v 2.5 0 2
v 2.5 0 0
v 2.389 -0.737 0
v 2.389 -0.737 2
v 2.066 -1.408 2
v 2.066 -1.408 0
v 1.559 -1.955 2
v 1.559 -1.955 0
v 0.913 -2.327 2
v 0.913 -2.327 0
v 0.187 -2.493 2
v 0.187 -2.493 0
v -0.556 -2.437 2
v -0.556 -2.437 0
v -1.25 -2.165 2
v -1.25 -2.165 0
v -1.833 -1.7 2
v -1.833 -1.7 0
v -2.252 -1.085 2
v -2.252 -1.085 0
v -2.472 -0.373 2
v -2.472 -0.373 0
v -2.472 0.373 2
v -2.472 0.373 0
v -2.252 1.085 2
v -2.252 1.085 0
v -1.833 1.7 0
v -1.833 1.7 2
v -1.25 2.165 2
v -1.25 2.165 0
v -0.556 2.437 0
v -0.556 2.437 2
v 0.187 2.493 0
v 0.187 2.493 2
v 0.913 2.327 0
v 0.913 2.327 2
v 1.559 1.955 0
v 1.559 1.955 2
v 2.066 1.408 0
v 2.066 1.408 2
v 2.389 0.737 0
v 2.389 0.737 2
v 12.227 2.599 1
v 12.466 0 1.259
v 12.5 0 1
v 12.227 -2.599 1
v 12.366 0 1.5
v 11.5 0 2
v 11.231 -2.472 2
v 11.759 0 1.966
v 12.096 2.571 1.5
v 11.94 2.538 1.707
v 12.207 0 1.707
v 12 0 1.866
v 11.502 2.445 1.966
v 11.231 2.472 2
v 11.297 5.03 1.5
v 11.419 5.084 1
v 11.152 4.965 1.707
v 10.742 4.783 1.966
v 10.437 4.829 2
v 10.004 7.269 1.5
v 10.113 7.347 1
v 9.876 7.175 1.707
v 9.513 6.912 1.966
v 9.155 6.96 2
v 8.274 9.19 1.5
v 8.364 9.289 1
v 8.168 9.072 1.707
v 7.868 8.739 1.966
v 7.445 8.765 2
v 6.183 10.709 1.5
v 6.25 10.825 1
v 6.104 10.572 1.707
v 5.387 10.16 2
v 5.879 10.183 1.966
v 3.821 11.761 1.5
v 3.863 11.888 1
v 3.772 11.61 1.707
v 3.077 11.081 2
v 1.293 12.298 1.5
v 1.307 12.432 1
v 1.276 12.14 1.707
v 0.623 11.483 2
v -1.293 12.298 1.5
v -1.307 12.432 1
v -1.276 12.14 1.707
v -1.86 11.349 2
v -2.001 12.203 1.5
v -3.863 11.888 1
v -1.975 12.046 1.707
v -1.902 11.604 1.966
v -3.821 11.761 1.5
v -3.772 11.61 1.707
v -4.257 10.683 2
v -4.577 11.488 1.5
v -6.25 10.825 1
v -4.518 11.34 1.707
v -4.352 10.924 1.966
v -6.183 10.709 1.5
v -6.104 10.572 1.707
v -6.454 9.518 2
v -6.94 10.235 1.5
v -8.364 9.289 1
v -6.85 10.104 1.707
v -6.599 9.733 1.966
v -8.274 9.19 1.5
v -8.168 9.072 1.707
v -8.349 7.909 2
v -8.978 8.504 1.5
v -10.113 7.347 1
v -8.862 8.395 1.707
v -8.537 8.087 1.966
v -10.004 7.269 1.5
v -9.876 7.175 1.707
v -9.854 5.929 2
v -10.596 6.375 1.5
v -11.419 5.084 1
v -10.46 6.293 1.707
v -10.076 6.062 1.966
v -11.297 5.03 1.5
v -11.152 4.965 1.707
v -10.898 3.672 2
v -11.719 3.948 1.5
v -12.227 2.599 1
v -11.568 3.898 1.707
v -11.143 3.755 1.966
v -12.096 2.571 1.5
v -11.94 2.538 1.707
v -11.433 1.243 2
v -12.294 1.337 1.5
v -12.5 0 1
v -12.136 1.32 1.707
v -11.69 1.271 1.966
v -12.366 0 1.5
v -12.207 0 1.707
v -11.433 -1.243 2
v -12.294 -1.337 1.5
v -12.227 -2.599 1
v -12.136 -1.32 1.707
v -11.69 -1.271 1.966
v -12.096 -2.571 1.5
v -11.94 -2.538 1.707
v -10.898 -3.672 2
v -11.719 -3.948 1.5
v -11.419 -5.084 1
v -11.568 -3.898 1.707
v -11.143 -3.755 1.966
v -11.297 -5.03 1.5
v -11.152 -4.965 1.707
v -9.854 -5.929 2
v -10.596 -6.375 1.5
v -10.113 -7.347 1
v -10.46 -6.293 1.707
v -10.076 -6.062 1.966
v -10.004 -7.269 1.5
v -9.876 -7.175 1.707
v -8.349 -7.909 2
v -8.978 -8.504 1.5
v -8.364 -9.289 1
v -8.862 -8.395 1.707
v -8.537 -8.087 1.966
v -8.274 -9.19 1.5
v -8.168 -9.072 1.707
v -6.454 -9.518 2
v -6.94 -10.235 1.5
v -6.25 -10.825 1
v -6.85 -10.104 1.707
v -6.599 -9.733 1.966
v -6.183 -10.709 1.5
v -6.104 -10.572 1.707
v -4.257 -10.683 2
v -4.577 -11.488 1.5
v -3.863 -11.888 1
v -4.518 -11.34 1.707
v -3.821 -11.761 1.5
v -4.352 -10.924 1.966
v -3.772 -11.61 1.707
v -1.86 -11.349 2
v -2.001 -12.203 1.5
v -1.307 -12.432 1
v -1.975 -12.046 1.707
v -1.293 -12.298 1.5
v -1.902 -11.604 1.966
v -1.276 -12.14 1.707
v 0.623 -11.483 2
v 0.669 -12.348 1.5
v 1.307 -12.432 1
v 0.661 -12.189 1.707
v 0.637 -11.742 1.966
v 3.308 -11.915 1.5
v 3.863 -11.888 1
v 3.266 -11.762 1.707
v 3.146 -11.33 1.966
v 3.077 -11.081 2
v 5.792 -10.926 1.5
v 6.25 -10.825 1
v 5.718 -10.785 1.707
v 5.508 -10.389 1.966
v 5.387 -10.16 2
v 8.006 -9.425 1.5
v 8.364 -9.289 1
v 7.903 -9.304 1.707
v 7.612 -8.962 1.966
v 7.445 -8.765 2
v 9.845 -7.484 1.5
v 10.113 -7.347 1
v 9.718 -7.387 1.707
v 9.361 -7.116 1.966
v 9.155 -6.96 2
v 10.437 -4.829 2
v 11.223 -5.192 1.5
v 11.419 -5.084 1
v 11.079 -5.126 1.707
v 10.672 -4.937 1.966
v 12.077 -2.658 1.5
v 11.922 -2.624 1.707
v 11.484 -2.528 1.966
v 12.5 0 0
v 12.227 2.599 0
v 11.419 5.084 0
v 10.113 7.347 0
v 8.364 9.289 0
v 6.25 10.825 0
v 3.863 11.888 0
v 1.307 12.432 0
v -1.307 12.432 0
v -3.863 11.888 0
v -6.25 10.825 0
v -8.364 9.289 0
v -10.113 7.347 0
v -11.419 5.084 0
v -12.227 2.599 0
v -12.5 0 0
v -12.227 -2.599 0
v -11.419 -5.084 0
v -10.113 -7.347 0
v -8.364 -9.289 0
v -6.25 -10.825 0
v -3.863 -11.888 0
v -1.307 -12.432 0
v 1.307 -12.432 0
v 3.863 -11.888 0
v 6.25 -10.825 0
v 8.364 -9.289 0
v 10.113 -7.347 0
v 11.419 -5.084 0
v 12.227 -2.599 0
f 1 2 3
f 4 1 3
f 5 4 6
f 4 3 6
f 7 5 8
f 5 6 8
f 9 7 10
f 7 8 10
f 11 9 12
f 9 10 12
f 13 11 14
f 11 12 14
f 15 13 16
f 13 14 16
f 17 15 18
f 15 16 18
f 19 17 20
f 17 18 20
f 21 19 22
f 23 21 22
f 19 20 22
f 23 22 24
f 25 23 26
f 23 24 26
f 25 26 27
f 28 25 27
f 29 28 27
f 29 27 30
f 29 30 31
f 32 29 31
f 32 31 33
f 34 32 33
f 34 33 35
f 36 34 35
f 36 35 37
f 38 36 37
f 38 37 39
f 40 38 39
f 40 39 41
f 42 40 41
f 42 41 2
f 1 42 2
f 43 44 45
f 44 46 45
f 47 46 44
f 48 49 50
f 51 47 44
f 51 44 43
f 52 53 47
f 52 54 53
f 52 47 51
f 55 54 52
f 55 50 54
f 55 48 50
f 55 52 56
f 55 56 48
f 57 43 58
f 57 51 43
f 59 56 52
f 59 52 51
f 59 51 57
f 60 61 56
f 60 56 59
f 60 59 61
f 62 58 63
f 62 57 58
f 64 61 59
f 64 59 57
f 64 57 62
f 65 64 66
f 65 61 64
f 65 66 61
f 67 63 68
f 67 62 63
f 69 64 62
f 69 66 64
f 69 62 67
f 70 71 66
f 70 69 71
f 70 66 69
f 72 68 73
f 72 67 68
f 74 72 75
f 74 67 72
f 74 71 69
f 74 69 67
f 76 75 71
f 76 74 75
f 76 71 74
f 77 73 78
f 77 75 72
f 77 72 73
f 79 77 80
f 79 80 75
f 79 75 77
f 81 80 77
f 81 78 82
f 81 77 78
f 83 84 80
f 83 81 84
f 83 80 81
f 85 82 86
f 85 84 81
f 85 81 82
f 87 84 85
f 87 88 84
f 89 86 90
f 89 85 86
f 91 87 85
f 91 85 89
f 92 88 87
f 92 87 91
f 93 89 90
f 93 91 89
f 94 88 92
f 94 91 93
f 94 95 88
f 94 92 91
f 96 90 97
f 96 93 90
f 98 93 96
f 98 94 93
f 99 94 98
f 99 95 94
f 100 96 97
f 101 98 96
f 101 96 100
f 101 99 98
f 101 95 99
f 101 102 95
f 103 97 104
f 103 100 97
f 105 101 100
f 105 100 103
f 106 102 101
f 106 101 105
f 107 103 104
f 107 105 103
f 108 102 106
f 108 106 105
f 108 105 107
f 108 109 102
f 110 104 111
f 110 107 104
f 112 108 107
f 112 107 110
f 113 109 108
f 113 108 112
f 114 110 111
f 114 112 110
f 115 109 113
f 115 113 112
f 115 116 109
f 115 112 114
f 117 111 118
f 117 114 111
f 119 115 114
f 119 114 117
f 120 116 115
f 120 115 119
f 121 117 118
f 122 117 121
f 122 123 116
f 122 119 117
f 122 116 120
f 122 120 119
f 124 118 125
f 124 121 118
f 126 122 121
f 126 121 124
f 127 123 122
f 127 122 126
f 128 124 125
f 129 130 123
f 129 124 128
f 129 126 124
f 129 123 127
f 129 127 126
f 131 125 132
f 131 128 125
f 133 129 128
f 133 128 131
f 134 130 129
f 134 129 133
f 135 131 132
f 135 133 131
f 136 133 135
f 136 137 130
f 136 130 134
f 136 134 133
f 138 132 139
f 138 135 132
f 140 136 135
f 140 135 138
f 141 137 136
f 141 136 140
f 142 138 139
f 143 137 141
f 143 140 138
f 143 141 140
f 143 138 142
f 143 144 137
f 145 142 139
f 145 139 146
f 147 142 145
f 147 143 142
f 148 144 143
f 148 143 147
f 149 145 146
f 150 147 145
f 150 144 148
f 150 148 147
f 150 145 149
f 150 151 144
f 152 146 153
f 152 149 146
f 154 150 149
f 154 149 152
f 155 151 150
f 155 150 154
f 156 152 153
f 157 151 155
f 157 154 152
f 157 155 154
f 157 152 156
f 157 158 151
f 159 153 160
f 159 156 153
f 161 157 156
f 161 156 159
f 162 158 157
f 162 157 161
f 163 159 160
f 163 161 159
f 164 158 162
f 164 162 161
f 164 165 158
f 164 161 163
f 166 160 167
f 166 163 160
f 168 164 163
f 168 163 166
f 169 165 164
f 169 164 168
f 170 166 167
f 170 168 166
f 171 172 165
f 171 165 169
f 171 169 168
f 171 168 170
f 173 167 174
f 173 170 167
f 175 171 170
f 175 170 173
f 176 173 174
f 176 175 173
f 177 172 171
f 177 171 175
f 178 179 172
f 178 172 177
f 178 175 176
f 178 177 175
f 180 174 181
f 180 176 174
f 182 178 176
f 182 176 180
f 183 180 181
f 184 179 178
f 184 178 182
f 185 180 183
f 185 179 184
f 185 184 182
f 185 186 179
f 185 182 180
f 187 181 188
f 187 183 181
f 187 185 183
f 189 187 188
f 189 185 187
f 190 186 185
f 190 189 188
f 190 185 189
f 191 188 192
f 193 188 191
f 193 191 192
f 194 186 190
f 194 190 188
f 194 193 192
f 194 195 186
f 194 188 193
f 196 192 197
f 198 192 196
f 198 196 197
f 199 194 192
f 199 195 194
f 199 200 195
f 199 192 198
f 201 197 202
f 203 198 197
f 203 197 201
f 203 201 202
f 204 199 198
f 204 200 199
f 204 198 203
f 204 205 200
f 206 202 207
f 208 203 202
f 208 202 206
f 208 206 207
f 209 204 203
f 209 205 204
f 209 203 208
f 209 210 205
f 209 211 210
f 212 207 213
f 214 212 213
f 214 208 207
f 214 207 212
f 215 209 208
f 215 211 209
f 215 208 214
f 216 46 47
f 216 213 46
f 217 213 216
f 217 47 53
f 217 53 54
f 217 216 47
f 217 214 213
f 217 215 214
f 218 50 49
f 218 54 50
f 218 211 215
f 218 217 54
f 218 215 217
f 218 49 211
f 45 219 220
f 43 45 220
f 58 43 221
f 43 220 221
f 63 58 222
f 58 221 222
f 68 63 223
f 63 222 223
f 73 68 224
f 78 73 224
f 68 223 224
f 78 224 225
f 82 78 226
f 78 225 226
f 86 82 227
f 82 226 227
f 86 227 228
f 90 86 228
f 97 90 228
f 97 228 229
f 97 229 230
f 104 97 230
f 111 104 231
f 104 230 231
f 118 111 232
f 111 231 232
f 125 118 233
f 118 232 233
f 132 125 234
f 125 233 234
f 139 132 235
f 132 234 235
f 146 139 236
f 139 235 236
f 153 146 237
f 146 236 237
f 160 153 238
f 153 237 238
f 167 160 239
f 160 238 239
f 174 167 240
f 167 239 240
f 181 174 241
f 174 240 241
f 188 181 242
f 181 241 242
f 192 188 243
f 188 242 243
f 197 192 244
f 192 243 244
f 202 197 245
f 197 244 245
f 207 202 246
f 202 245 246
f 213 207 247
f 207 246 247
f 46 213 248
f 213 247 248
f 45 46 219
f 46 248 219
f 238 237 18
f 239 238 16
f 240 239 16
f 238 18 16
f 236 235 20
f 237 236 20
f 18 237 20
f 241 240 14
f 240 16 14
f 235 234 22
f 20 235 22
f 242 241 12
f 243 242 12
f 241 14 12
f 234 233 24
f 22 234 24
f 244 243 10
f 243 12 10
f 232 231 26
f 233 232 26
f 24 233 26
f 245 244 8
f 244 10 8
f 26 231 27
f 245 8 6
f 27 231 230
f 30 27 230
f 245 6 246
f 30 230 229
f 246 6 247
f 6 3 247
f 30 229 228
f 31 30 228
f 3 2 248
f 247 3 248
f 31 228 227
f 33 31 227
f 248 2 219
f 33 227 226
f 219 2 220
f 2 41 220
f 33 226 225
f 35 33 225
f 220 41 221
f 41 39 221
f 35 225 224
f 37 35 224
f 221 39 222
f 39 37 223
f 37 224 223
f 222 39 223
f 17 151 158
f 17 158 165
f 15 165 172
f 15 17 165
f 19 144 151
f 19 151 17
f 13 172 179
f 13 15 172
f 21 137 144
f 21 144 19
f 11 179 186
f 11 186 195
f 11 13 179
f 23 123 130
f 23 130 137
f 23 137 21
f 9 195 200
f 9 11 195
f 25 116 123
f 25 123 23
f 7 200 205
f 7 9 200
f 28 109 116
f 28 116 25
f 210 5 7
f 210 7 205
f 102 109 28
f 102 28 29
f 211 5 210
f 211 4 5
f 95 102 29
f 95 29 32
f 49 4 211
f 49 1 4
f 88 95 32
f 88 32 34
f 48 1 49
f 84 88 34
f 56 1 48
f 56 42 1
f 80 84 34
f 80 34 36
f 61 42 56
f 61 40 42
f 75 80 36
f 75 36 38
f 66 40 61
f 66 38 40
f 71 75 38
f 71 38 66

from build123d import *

# Parameters (mm, degrees)
F0_R     = 12.5
F1_DEPTH = 2
F2_R     = 1
F3_R     = 2.5
F4_DEPTH = 25.4


with BuildPart() as f1:
    # F0 (on Top) → F1 (new body)
    with BuildSketch(Plane.XY):
        Circle(F0_R)
    extrude(amount=F1_DEPTH)

    # F2
    f2_edges = [f1.edges().sort_by_distance(p)[0] for p in [
        (-12.5, 0, 2),
    ]]
    fillet(f2_edges, radius=F2_R)

    # F3 (on face) → F4 (cut)
    with BuildSketch(Plane(origin=(0, 0, 0), x_dir=(1, 0, 0), z_dir=(0, 0, -1))):
        Circle(F3_R)
    extrude(amount=-F4_DEPTH, mode=Mode.SUBTRACT)


solid = f1.part
